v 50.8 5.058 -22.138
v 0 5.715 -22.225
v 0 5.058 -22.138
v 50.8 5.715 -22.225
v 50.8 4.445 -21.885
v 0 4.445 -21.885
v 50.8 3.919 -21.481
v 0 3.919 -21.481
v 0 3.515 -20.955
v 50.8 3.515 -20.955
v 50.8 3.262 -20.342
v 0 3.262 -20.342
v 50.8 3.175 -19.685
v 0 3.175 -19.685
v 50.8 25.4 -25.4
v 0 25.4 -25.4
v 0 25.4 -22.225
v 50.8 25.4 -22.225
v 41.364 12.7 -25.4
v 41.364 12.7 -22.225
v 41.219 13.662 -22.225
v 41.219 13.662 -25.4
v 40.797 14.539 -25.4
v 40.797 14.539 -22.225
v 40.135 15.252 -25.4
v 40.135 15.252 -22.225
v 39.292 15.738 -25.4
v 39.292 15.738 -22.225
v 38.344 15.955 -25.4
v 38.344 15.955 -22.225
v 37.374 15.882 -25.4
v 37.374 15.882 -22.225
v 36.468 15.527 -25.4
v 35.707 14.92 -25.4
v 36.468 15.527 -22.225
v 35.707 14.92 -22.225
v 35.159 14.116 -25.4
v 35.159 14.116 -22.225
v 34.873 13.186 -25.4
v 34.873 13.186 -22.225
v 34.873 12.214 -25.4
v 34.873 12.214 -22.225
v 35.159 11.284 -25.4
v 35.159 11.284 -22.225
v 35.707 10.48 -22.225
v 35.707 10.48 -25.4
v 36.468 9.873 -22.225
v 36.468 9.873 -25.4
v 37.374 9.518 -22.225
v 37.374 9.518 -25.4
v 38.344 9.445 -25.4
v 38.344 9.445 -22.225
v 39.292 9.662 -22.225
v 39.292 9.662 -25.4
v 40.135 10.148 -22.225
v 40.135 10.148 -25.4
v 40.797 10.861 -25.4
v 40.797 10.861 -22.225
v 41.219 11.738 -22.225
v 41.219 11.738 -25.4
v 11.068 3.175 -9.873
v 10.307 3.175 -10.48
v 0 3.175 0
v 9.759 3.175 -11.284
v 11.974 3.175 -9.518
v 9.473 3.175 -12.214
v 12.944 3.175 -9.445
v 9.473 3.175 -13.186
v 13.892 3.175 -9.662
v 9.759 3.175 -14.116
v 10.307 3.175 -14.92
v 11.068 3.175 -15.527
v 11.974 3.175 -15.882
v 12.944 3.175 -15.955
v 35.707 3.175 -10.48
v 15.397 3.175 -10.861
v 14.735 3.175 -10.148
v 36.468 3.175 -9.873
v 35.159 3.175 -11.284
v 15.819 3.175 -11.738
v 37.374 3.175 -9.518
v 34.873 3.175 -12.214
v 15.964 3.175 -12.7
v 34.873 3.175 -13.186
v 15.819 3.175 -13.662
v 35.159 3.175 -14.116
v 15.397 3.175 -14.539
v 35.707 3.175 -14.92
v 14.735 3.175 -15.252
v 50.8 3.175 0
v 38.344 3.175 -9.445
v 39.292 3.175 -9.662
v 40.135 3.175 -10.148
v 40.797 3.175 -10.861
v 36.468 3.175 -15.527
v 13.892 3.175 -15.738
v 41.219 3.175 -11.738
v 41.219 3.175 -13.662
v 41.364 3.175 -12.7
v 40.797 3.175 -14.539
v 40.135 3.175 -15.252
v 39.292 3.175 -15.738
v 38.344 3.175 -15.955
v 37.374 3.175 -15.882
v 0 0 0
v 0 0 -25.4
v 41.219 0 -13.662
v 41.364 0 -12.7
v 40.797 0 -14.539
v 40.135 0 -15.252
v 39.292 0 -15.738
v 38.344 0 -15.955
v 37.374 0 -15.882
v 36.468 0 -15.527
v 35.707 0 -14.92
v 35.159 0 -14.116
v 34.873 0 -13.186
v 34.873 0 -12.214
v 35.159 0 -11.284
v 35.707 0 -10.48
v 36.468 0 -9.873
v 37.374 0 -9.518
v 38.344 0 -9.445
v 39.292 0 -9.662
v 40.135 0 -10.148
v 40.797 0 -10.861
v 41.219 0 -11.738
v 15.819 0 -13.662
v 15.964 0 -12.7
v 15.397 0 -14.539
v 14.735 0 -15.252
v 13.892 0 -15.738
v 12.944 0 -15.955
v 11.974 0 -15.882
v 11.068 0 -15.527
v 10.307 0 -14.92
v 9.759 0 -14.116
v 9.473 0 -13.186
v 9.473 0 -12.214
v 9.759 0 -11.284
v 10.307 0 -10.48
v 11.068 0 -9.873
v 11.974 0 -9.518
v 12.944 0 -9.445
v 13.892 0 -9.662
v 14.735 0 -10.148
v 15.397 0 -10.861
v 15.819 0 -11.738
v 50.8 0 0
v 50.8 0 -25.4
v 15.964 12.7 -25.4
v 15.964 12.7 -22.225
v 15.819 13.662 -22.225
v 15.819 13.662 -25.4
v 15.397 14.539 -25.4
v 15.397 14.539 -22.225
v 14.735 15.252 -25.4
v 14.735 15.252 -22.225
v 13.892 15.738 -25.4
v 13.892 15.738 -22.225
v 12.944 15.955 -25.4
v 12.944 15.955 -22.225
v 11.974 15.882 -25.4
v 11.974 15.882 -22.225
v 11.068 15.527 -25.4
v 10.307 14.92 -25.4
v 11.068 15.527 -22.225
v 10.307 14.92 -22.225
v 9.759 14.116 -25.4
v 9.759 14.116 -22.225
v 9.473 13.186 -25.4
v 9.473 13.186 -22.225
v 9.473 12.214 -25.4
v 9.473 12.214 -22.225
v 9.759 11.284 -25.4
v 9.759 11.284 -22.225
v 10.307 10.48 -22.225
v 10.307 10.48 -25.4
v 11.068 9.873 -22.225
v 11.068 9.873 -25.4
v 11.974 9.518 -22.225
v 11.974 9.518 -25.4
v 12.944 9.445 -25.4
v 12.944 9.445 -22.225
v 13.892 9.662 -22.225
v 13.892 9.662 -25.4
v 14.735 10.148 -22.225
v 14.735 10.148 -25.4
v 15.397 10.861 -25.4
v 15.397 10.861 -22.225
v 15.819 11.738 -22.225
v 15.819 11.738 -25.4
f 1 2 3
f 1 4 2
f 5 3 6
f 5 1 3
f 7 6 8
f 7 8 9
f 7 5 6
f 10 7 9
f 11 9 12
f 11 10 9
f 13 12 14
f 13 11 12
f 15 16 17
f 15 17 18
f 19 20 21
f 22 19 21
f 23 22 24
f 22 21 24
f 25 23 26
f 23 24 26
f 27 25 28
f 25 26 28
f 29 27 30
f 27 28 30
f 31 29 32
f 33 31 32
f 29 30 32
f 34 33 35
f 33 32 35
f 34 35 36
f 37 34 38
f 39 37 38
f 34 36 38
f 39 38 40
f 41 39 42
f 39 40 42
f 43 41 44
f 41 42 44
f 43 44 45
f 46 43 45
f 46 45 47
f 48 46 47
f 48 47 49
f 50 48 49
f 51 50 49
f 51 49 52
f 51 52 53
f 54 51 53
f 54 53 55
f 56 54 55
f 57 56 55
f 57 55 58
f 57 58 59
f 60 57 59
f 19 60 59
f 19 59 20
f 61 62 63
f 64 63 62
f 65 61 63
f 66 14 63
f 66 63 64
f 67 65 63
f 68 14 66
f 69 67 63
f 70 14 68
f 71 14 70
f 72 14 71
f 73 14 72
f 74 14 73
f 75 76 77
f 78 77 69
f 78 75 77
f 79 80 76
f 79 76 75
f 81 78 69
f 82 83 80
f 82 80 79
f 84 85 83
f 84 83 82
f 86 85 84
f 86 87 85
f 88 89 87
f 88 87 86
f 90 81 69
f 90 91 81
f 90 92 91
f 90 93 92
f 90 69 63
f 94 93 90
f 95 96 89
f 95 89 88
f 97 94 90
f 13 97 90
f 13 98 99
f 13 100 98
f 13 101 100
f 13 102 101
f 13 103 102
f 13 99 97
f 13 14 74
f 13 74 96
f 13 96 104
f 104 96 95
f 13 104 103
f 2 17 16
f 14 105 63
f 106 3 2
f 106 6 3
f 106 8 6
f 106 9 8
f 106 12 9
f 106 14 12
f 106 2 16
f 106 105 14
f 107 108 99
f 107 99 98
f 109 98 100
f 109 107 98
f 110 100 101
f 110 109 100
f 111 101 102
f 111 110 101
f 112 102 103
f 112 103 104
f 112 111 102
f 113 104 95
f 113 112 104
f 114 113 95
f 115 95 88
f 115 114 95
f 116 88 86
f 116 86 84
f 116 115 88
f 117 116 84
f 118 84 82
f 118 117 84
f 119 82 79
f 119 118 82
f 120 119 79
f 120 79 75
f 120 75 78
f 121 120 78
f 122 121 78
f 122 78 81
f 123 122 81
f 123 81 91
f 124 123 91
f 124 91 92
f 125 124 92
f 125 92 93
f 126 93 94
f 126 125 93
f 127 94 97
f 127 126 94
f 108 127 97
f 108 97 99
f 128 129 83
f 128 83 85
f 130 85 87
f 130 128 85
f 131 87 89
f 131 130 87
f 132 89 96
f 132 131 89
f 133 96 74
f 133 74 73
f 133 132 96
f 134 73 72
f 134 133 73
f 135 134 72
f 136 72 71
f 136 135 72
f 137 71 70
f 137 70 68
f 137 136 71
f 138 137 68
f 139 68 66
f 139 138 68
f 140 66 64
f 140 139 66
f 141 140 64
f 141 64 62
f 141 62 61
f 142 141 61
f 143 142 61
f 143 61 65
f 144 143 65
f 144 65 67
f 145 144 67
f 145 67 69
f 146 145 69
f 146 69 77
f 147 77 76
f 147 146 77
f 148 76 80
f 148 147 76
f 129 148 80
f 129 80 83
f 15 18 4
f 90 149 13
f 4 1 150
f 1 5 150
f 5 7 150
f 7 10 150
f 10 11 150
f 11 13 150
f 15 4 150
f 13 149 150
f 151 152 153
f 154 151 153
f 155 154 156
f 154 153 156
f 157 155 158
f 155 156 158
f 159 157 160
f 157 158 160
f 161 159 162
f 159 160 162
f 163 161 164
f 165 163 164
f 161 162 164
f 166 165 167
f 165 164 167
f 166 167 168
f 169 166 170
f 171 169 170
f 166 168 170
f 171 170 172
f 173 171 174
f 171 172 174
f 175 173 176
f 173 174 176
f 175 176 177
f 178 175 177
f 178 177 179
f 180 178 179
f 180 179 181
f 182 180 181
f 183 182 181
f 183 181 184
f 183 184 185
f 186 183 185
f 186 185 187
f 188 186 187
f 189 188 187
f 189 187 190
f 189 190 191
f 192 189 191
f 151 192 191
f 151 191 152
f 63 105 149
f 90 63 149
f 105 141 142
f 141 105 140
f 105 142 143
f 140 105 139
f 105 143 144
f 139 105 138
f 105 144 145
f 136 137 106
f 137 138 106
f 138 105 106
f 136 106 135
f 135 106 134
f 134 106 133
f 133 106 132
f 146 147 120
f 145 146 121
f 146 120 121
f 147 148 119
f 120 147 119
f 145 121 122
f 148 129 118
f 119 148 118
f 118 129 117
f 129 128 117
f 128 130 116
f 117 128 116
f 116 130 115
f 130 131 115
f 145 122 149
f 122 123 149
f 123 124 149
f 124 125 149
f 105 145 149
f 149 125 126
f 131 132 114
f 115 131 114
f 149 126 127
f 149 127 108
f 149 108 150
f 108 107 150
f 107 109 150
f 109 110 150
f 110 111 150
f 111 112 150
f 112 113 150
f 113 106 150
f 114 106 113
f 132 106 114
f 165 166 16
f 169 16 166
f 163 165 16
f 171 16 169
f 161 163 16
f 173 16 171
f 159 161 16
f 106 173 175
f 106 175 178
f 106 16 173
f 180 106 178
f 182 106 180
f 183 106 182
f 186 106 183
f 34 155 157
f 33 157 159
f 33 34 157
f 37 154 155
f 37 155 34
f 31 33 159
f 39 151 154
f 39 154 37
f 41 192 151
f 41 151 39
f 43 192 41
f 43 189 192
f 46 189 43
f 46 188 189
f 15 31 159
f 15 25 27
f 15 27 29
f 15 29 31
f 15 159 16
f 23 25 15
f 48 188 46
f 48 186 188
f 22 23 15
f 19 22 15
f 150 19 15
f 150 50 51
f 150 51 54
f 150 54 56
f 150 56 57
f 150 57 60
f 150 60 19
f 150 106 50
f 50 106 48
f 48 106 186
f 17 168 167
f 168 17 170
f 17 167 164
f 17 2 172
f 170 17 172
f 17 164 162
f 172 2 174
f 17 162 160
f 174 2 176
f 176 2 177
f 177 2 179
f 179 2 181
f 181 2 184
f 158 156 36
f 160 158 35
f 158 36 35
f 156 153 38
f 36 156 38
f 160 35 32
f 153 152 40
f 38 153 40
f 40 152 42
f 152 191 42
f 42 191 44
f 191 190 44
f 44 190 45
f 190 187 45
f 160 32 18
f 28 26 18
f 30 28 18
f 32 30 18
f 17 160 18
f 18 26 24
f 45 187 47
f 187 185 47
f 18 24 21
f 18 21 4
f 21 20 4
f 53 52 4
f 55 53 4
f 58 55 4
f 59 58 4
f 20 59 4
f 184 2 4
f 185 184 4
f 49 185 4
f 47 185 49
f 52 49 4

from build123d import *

# Parameters (mm, degrees)
SKETCH1_W           = 50.8
SKETCH1_H           = 25.4
SKETCH1_R           = 3.2639
BOSS_EXTRUDE1_DEPTH = 3.175
SKETCH2_W           = 50.8
SKETCH2_H           = 3.175
BOSS_EXTRUDE2_DEPTH = 22.225
SKETCH3_R           = 3.2639
CUT_EXTRUDE1_DEPTH  = 22.225
FILLET1_R           = 2.54


with BuildPart() as part:
    # Sketch1 → Boss-Extrude1 (new body)
    with BuildSketch(Plane(origin=(0, 0, 0), x_dir=(1, 0, 0), z_dir=(0, 1, 0))):
        with Locations((25.4, 12.7)):
            Rectangle(SKETCH1_W, SKETCH1_H)
        with Locations((12.7, 12.7)):
            Circle(SKETCH1_R, mode=Mode.SUBTRACT)
        with Locations((38.1, 12.7)):
            Circle(SKETCH1_R, mode=Mode.SUBTRACT)
    extrude(amount=BOSS_EXTRUDE1_DEPTH)

    # Sketch2 → Boss-Extrude2 (add)
    with BuildSketch(Plane(origin=(0, 3.175, 0), x_dir=(1, 0, 0), z_dir=(0, 1, 0))):
        with Locations((25.4, 23.8125)):
            Rectangle(SKETCH2_W, SKETCH2_H)
    extrude(amount=BOSS_EXTRUDE2_DEPTH)

    # Sketch3 → Cut-Extrude1 (cut)
    with BuildSketch(Plane.XY.offset(-22.225)):
        with Locations((38.1, 12.7)):
            Circle(SKETCH3_R)
        with Locations((12.7, 12.7)):
            Circle(SKETCH3_R)
    extrude(amount=-CUT_EXTRUDE1_DEPTH, mode=Mode.SUBTRACT)

    # Fillet1
    fillet1_edges = [part.edges().sort_by_distance(p)[0] for p in [
        (25.4, 3.175, -22.225),
    ]]
    fillet(fillet1_edges, radius=FILLET1_R)


solid = part.part
